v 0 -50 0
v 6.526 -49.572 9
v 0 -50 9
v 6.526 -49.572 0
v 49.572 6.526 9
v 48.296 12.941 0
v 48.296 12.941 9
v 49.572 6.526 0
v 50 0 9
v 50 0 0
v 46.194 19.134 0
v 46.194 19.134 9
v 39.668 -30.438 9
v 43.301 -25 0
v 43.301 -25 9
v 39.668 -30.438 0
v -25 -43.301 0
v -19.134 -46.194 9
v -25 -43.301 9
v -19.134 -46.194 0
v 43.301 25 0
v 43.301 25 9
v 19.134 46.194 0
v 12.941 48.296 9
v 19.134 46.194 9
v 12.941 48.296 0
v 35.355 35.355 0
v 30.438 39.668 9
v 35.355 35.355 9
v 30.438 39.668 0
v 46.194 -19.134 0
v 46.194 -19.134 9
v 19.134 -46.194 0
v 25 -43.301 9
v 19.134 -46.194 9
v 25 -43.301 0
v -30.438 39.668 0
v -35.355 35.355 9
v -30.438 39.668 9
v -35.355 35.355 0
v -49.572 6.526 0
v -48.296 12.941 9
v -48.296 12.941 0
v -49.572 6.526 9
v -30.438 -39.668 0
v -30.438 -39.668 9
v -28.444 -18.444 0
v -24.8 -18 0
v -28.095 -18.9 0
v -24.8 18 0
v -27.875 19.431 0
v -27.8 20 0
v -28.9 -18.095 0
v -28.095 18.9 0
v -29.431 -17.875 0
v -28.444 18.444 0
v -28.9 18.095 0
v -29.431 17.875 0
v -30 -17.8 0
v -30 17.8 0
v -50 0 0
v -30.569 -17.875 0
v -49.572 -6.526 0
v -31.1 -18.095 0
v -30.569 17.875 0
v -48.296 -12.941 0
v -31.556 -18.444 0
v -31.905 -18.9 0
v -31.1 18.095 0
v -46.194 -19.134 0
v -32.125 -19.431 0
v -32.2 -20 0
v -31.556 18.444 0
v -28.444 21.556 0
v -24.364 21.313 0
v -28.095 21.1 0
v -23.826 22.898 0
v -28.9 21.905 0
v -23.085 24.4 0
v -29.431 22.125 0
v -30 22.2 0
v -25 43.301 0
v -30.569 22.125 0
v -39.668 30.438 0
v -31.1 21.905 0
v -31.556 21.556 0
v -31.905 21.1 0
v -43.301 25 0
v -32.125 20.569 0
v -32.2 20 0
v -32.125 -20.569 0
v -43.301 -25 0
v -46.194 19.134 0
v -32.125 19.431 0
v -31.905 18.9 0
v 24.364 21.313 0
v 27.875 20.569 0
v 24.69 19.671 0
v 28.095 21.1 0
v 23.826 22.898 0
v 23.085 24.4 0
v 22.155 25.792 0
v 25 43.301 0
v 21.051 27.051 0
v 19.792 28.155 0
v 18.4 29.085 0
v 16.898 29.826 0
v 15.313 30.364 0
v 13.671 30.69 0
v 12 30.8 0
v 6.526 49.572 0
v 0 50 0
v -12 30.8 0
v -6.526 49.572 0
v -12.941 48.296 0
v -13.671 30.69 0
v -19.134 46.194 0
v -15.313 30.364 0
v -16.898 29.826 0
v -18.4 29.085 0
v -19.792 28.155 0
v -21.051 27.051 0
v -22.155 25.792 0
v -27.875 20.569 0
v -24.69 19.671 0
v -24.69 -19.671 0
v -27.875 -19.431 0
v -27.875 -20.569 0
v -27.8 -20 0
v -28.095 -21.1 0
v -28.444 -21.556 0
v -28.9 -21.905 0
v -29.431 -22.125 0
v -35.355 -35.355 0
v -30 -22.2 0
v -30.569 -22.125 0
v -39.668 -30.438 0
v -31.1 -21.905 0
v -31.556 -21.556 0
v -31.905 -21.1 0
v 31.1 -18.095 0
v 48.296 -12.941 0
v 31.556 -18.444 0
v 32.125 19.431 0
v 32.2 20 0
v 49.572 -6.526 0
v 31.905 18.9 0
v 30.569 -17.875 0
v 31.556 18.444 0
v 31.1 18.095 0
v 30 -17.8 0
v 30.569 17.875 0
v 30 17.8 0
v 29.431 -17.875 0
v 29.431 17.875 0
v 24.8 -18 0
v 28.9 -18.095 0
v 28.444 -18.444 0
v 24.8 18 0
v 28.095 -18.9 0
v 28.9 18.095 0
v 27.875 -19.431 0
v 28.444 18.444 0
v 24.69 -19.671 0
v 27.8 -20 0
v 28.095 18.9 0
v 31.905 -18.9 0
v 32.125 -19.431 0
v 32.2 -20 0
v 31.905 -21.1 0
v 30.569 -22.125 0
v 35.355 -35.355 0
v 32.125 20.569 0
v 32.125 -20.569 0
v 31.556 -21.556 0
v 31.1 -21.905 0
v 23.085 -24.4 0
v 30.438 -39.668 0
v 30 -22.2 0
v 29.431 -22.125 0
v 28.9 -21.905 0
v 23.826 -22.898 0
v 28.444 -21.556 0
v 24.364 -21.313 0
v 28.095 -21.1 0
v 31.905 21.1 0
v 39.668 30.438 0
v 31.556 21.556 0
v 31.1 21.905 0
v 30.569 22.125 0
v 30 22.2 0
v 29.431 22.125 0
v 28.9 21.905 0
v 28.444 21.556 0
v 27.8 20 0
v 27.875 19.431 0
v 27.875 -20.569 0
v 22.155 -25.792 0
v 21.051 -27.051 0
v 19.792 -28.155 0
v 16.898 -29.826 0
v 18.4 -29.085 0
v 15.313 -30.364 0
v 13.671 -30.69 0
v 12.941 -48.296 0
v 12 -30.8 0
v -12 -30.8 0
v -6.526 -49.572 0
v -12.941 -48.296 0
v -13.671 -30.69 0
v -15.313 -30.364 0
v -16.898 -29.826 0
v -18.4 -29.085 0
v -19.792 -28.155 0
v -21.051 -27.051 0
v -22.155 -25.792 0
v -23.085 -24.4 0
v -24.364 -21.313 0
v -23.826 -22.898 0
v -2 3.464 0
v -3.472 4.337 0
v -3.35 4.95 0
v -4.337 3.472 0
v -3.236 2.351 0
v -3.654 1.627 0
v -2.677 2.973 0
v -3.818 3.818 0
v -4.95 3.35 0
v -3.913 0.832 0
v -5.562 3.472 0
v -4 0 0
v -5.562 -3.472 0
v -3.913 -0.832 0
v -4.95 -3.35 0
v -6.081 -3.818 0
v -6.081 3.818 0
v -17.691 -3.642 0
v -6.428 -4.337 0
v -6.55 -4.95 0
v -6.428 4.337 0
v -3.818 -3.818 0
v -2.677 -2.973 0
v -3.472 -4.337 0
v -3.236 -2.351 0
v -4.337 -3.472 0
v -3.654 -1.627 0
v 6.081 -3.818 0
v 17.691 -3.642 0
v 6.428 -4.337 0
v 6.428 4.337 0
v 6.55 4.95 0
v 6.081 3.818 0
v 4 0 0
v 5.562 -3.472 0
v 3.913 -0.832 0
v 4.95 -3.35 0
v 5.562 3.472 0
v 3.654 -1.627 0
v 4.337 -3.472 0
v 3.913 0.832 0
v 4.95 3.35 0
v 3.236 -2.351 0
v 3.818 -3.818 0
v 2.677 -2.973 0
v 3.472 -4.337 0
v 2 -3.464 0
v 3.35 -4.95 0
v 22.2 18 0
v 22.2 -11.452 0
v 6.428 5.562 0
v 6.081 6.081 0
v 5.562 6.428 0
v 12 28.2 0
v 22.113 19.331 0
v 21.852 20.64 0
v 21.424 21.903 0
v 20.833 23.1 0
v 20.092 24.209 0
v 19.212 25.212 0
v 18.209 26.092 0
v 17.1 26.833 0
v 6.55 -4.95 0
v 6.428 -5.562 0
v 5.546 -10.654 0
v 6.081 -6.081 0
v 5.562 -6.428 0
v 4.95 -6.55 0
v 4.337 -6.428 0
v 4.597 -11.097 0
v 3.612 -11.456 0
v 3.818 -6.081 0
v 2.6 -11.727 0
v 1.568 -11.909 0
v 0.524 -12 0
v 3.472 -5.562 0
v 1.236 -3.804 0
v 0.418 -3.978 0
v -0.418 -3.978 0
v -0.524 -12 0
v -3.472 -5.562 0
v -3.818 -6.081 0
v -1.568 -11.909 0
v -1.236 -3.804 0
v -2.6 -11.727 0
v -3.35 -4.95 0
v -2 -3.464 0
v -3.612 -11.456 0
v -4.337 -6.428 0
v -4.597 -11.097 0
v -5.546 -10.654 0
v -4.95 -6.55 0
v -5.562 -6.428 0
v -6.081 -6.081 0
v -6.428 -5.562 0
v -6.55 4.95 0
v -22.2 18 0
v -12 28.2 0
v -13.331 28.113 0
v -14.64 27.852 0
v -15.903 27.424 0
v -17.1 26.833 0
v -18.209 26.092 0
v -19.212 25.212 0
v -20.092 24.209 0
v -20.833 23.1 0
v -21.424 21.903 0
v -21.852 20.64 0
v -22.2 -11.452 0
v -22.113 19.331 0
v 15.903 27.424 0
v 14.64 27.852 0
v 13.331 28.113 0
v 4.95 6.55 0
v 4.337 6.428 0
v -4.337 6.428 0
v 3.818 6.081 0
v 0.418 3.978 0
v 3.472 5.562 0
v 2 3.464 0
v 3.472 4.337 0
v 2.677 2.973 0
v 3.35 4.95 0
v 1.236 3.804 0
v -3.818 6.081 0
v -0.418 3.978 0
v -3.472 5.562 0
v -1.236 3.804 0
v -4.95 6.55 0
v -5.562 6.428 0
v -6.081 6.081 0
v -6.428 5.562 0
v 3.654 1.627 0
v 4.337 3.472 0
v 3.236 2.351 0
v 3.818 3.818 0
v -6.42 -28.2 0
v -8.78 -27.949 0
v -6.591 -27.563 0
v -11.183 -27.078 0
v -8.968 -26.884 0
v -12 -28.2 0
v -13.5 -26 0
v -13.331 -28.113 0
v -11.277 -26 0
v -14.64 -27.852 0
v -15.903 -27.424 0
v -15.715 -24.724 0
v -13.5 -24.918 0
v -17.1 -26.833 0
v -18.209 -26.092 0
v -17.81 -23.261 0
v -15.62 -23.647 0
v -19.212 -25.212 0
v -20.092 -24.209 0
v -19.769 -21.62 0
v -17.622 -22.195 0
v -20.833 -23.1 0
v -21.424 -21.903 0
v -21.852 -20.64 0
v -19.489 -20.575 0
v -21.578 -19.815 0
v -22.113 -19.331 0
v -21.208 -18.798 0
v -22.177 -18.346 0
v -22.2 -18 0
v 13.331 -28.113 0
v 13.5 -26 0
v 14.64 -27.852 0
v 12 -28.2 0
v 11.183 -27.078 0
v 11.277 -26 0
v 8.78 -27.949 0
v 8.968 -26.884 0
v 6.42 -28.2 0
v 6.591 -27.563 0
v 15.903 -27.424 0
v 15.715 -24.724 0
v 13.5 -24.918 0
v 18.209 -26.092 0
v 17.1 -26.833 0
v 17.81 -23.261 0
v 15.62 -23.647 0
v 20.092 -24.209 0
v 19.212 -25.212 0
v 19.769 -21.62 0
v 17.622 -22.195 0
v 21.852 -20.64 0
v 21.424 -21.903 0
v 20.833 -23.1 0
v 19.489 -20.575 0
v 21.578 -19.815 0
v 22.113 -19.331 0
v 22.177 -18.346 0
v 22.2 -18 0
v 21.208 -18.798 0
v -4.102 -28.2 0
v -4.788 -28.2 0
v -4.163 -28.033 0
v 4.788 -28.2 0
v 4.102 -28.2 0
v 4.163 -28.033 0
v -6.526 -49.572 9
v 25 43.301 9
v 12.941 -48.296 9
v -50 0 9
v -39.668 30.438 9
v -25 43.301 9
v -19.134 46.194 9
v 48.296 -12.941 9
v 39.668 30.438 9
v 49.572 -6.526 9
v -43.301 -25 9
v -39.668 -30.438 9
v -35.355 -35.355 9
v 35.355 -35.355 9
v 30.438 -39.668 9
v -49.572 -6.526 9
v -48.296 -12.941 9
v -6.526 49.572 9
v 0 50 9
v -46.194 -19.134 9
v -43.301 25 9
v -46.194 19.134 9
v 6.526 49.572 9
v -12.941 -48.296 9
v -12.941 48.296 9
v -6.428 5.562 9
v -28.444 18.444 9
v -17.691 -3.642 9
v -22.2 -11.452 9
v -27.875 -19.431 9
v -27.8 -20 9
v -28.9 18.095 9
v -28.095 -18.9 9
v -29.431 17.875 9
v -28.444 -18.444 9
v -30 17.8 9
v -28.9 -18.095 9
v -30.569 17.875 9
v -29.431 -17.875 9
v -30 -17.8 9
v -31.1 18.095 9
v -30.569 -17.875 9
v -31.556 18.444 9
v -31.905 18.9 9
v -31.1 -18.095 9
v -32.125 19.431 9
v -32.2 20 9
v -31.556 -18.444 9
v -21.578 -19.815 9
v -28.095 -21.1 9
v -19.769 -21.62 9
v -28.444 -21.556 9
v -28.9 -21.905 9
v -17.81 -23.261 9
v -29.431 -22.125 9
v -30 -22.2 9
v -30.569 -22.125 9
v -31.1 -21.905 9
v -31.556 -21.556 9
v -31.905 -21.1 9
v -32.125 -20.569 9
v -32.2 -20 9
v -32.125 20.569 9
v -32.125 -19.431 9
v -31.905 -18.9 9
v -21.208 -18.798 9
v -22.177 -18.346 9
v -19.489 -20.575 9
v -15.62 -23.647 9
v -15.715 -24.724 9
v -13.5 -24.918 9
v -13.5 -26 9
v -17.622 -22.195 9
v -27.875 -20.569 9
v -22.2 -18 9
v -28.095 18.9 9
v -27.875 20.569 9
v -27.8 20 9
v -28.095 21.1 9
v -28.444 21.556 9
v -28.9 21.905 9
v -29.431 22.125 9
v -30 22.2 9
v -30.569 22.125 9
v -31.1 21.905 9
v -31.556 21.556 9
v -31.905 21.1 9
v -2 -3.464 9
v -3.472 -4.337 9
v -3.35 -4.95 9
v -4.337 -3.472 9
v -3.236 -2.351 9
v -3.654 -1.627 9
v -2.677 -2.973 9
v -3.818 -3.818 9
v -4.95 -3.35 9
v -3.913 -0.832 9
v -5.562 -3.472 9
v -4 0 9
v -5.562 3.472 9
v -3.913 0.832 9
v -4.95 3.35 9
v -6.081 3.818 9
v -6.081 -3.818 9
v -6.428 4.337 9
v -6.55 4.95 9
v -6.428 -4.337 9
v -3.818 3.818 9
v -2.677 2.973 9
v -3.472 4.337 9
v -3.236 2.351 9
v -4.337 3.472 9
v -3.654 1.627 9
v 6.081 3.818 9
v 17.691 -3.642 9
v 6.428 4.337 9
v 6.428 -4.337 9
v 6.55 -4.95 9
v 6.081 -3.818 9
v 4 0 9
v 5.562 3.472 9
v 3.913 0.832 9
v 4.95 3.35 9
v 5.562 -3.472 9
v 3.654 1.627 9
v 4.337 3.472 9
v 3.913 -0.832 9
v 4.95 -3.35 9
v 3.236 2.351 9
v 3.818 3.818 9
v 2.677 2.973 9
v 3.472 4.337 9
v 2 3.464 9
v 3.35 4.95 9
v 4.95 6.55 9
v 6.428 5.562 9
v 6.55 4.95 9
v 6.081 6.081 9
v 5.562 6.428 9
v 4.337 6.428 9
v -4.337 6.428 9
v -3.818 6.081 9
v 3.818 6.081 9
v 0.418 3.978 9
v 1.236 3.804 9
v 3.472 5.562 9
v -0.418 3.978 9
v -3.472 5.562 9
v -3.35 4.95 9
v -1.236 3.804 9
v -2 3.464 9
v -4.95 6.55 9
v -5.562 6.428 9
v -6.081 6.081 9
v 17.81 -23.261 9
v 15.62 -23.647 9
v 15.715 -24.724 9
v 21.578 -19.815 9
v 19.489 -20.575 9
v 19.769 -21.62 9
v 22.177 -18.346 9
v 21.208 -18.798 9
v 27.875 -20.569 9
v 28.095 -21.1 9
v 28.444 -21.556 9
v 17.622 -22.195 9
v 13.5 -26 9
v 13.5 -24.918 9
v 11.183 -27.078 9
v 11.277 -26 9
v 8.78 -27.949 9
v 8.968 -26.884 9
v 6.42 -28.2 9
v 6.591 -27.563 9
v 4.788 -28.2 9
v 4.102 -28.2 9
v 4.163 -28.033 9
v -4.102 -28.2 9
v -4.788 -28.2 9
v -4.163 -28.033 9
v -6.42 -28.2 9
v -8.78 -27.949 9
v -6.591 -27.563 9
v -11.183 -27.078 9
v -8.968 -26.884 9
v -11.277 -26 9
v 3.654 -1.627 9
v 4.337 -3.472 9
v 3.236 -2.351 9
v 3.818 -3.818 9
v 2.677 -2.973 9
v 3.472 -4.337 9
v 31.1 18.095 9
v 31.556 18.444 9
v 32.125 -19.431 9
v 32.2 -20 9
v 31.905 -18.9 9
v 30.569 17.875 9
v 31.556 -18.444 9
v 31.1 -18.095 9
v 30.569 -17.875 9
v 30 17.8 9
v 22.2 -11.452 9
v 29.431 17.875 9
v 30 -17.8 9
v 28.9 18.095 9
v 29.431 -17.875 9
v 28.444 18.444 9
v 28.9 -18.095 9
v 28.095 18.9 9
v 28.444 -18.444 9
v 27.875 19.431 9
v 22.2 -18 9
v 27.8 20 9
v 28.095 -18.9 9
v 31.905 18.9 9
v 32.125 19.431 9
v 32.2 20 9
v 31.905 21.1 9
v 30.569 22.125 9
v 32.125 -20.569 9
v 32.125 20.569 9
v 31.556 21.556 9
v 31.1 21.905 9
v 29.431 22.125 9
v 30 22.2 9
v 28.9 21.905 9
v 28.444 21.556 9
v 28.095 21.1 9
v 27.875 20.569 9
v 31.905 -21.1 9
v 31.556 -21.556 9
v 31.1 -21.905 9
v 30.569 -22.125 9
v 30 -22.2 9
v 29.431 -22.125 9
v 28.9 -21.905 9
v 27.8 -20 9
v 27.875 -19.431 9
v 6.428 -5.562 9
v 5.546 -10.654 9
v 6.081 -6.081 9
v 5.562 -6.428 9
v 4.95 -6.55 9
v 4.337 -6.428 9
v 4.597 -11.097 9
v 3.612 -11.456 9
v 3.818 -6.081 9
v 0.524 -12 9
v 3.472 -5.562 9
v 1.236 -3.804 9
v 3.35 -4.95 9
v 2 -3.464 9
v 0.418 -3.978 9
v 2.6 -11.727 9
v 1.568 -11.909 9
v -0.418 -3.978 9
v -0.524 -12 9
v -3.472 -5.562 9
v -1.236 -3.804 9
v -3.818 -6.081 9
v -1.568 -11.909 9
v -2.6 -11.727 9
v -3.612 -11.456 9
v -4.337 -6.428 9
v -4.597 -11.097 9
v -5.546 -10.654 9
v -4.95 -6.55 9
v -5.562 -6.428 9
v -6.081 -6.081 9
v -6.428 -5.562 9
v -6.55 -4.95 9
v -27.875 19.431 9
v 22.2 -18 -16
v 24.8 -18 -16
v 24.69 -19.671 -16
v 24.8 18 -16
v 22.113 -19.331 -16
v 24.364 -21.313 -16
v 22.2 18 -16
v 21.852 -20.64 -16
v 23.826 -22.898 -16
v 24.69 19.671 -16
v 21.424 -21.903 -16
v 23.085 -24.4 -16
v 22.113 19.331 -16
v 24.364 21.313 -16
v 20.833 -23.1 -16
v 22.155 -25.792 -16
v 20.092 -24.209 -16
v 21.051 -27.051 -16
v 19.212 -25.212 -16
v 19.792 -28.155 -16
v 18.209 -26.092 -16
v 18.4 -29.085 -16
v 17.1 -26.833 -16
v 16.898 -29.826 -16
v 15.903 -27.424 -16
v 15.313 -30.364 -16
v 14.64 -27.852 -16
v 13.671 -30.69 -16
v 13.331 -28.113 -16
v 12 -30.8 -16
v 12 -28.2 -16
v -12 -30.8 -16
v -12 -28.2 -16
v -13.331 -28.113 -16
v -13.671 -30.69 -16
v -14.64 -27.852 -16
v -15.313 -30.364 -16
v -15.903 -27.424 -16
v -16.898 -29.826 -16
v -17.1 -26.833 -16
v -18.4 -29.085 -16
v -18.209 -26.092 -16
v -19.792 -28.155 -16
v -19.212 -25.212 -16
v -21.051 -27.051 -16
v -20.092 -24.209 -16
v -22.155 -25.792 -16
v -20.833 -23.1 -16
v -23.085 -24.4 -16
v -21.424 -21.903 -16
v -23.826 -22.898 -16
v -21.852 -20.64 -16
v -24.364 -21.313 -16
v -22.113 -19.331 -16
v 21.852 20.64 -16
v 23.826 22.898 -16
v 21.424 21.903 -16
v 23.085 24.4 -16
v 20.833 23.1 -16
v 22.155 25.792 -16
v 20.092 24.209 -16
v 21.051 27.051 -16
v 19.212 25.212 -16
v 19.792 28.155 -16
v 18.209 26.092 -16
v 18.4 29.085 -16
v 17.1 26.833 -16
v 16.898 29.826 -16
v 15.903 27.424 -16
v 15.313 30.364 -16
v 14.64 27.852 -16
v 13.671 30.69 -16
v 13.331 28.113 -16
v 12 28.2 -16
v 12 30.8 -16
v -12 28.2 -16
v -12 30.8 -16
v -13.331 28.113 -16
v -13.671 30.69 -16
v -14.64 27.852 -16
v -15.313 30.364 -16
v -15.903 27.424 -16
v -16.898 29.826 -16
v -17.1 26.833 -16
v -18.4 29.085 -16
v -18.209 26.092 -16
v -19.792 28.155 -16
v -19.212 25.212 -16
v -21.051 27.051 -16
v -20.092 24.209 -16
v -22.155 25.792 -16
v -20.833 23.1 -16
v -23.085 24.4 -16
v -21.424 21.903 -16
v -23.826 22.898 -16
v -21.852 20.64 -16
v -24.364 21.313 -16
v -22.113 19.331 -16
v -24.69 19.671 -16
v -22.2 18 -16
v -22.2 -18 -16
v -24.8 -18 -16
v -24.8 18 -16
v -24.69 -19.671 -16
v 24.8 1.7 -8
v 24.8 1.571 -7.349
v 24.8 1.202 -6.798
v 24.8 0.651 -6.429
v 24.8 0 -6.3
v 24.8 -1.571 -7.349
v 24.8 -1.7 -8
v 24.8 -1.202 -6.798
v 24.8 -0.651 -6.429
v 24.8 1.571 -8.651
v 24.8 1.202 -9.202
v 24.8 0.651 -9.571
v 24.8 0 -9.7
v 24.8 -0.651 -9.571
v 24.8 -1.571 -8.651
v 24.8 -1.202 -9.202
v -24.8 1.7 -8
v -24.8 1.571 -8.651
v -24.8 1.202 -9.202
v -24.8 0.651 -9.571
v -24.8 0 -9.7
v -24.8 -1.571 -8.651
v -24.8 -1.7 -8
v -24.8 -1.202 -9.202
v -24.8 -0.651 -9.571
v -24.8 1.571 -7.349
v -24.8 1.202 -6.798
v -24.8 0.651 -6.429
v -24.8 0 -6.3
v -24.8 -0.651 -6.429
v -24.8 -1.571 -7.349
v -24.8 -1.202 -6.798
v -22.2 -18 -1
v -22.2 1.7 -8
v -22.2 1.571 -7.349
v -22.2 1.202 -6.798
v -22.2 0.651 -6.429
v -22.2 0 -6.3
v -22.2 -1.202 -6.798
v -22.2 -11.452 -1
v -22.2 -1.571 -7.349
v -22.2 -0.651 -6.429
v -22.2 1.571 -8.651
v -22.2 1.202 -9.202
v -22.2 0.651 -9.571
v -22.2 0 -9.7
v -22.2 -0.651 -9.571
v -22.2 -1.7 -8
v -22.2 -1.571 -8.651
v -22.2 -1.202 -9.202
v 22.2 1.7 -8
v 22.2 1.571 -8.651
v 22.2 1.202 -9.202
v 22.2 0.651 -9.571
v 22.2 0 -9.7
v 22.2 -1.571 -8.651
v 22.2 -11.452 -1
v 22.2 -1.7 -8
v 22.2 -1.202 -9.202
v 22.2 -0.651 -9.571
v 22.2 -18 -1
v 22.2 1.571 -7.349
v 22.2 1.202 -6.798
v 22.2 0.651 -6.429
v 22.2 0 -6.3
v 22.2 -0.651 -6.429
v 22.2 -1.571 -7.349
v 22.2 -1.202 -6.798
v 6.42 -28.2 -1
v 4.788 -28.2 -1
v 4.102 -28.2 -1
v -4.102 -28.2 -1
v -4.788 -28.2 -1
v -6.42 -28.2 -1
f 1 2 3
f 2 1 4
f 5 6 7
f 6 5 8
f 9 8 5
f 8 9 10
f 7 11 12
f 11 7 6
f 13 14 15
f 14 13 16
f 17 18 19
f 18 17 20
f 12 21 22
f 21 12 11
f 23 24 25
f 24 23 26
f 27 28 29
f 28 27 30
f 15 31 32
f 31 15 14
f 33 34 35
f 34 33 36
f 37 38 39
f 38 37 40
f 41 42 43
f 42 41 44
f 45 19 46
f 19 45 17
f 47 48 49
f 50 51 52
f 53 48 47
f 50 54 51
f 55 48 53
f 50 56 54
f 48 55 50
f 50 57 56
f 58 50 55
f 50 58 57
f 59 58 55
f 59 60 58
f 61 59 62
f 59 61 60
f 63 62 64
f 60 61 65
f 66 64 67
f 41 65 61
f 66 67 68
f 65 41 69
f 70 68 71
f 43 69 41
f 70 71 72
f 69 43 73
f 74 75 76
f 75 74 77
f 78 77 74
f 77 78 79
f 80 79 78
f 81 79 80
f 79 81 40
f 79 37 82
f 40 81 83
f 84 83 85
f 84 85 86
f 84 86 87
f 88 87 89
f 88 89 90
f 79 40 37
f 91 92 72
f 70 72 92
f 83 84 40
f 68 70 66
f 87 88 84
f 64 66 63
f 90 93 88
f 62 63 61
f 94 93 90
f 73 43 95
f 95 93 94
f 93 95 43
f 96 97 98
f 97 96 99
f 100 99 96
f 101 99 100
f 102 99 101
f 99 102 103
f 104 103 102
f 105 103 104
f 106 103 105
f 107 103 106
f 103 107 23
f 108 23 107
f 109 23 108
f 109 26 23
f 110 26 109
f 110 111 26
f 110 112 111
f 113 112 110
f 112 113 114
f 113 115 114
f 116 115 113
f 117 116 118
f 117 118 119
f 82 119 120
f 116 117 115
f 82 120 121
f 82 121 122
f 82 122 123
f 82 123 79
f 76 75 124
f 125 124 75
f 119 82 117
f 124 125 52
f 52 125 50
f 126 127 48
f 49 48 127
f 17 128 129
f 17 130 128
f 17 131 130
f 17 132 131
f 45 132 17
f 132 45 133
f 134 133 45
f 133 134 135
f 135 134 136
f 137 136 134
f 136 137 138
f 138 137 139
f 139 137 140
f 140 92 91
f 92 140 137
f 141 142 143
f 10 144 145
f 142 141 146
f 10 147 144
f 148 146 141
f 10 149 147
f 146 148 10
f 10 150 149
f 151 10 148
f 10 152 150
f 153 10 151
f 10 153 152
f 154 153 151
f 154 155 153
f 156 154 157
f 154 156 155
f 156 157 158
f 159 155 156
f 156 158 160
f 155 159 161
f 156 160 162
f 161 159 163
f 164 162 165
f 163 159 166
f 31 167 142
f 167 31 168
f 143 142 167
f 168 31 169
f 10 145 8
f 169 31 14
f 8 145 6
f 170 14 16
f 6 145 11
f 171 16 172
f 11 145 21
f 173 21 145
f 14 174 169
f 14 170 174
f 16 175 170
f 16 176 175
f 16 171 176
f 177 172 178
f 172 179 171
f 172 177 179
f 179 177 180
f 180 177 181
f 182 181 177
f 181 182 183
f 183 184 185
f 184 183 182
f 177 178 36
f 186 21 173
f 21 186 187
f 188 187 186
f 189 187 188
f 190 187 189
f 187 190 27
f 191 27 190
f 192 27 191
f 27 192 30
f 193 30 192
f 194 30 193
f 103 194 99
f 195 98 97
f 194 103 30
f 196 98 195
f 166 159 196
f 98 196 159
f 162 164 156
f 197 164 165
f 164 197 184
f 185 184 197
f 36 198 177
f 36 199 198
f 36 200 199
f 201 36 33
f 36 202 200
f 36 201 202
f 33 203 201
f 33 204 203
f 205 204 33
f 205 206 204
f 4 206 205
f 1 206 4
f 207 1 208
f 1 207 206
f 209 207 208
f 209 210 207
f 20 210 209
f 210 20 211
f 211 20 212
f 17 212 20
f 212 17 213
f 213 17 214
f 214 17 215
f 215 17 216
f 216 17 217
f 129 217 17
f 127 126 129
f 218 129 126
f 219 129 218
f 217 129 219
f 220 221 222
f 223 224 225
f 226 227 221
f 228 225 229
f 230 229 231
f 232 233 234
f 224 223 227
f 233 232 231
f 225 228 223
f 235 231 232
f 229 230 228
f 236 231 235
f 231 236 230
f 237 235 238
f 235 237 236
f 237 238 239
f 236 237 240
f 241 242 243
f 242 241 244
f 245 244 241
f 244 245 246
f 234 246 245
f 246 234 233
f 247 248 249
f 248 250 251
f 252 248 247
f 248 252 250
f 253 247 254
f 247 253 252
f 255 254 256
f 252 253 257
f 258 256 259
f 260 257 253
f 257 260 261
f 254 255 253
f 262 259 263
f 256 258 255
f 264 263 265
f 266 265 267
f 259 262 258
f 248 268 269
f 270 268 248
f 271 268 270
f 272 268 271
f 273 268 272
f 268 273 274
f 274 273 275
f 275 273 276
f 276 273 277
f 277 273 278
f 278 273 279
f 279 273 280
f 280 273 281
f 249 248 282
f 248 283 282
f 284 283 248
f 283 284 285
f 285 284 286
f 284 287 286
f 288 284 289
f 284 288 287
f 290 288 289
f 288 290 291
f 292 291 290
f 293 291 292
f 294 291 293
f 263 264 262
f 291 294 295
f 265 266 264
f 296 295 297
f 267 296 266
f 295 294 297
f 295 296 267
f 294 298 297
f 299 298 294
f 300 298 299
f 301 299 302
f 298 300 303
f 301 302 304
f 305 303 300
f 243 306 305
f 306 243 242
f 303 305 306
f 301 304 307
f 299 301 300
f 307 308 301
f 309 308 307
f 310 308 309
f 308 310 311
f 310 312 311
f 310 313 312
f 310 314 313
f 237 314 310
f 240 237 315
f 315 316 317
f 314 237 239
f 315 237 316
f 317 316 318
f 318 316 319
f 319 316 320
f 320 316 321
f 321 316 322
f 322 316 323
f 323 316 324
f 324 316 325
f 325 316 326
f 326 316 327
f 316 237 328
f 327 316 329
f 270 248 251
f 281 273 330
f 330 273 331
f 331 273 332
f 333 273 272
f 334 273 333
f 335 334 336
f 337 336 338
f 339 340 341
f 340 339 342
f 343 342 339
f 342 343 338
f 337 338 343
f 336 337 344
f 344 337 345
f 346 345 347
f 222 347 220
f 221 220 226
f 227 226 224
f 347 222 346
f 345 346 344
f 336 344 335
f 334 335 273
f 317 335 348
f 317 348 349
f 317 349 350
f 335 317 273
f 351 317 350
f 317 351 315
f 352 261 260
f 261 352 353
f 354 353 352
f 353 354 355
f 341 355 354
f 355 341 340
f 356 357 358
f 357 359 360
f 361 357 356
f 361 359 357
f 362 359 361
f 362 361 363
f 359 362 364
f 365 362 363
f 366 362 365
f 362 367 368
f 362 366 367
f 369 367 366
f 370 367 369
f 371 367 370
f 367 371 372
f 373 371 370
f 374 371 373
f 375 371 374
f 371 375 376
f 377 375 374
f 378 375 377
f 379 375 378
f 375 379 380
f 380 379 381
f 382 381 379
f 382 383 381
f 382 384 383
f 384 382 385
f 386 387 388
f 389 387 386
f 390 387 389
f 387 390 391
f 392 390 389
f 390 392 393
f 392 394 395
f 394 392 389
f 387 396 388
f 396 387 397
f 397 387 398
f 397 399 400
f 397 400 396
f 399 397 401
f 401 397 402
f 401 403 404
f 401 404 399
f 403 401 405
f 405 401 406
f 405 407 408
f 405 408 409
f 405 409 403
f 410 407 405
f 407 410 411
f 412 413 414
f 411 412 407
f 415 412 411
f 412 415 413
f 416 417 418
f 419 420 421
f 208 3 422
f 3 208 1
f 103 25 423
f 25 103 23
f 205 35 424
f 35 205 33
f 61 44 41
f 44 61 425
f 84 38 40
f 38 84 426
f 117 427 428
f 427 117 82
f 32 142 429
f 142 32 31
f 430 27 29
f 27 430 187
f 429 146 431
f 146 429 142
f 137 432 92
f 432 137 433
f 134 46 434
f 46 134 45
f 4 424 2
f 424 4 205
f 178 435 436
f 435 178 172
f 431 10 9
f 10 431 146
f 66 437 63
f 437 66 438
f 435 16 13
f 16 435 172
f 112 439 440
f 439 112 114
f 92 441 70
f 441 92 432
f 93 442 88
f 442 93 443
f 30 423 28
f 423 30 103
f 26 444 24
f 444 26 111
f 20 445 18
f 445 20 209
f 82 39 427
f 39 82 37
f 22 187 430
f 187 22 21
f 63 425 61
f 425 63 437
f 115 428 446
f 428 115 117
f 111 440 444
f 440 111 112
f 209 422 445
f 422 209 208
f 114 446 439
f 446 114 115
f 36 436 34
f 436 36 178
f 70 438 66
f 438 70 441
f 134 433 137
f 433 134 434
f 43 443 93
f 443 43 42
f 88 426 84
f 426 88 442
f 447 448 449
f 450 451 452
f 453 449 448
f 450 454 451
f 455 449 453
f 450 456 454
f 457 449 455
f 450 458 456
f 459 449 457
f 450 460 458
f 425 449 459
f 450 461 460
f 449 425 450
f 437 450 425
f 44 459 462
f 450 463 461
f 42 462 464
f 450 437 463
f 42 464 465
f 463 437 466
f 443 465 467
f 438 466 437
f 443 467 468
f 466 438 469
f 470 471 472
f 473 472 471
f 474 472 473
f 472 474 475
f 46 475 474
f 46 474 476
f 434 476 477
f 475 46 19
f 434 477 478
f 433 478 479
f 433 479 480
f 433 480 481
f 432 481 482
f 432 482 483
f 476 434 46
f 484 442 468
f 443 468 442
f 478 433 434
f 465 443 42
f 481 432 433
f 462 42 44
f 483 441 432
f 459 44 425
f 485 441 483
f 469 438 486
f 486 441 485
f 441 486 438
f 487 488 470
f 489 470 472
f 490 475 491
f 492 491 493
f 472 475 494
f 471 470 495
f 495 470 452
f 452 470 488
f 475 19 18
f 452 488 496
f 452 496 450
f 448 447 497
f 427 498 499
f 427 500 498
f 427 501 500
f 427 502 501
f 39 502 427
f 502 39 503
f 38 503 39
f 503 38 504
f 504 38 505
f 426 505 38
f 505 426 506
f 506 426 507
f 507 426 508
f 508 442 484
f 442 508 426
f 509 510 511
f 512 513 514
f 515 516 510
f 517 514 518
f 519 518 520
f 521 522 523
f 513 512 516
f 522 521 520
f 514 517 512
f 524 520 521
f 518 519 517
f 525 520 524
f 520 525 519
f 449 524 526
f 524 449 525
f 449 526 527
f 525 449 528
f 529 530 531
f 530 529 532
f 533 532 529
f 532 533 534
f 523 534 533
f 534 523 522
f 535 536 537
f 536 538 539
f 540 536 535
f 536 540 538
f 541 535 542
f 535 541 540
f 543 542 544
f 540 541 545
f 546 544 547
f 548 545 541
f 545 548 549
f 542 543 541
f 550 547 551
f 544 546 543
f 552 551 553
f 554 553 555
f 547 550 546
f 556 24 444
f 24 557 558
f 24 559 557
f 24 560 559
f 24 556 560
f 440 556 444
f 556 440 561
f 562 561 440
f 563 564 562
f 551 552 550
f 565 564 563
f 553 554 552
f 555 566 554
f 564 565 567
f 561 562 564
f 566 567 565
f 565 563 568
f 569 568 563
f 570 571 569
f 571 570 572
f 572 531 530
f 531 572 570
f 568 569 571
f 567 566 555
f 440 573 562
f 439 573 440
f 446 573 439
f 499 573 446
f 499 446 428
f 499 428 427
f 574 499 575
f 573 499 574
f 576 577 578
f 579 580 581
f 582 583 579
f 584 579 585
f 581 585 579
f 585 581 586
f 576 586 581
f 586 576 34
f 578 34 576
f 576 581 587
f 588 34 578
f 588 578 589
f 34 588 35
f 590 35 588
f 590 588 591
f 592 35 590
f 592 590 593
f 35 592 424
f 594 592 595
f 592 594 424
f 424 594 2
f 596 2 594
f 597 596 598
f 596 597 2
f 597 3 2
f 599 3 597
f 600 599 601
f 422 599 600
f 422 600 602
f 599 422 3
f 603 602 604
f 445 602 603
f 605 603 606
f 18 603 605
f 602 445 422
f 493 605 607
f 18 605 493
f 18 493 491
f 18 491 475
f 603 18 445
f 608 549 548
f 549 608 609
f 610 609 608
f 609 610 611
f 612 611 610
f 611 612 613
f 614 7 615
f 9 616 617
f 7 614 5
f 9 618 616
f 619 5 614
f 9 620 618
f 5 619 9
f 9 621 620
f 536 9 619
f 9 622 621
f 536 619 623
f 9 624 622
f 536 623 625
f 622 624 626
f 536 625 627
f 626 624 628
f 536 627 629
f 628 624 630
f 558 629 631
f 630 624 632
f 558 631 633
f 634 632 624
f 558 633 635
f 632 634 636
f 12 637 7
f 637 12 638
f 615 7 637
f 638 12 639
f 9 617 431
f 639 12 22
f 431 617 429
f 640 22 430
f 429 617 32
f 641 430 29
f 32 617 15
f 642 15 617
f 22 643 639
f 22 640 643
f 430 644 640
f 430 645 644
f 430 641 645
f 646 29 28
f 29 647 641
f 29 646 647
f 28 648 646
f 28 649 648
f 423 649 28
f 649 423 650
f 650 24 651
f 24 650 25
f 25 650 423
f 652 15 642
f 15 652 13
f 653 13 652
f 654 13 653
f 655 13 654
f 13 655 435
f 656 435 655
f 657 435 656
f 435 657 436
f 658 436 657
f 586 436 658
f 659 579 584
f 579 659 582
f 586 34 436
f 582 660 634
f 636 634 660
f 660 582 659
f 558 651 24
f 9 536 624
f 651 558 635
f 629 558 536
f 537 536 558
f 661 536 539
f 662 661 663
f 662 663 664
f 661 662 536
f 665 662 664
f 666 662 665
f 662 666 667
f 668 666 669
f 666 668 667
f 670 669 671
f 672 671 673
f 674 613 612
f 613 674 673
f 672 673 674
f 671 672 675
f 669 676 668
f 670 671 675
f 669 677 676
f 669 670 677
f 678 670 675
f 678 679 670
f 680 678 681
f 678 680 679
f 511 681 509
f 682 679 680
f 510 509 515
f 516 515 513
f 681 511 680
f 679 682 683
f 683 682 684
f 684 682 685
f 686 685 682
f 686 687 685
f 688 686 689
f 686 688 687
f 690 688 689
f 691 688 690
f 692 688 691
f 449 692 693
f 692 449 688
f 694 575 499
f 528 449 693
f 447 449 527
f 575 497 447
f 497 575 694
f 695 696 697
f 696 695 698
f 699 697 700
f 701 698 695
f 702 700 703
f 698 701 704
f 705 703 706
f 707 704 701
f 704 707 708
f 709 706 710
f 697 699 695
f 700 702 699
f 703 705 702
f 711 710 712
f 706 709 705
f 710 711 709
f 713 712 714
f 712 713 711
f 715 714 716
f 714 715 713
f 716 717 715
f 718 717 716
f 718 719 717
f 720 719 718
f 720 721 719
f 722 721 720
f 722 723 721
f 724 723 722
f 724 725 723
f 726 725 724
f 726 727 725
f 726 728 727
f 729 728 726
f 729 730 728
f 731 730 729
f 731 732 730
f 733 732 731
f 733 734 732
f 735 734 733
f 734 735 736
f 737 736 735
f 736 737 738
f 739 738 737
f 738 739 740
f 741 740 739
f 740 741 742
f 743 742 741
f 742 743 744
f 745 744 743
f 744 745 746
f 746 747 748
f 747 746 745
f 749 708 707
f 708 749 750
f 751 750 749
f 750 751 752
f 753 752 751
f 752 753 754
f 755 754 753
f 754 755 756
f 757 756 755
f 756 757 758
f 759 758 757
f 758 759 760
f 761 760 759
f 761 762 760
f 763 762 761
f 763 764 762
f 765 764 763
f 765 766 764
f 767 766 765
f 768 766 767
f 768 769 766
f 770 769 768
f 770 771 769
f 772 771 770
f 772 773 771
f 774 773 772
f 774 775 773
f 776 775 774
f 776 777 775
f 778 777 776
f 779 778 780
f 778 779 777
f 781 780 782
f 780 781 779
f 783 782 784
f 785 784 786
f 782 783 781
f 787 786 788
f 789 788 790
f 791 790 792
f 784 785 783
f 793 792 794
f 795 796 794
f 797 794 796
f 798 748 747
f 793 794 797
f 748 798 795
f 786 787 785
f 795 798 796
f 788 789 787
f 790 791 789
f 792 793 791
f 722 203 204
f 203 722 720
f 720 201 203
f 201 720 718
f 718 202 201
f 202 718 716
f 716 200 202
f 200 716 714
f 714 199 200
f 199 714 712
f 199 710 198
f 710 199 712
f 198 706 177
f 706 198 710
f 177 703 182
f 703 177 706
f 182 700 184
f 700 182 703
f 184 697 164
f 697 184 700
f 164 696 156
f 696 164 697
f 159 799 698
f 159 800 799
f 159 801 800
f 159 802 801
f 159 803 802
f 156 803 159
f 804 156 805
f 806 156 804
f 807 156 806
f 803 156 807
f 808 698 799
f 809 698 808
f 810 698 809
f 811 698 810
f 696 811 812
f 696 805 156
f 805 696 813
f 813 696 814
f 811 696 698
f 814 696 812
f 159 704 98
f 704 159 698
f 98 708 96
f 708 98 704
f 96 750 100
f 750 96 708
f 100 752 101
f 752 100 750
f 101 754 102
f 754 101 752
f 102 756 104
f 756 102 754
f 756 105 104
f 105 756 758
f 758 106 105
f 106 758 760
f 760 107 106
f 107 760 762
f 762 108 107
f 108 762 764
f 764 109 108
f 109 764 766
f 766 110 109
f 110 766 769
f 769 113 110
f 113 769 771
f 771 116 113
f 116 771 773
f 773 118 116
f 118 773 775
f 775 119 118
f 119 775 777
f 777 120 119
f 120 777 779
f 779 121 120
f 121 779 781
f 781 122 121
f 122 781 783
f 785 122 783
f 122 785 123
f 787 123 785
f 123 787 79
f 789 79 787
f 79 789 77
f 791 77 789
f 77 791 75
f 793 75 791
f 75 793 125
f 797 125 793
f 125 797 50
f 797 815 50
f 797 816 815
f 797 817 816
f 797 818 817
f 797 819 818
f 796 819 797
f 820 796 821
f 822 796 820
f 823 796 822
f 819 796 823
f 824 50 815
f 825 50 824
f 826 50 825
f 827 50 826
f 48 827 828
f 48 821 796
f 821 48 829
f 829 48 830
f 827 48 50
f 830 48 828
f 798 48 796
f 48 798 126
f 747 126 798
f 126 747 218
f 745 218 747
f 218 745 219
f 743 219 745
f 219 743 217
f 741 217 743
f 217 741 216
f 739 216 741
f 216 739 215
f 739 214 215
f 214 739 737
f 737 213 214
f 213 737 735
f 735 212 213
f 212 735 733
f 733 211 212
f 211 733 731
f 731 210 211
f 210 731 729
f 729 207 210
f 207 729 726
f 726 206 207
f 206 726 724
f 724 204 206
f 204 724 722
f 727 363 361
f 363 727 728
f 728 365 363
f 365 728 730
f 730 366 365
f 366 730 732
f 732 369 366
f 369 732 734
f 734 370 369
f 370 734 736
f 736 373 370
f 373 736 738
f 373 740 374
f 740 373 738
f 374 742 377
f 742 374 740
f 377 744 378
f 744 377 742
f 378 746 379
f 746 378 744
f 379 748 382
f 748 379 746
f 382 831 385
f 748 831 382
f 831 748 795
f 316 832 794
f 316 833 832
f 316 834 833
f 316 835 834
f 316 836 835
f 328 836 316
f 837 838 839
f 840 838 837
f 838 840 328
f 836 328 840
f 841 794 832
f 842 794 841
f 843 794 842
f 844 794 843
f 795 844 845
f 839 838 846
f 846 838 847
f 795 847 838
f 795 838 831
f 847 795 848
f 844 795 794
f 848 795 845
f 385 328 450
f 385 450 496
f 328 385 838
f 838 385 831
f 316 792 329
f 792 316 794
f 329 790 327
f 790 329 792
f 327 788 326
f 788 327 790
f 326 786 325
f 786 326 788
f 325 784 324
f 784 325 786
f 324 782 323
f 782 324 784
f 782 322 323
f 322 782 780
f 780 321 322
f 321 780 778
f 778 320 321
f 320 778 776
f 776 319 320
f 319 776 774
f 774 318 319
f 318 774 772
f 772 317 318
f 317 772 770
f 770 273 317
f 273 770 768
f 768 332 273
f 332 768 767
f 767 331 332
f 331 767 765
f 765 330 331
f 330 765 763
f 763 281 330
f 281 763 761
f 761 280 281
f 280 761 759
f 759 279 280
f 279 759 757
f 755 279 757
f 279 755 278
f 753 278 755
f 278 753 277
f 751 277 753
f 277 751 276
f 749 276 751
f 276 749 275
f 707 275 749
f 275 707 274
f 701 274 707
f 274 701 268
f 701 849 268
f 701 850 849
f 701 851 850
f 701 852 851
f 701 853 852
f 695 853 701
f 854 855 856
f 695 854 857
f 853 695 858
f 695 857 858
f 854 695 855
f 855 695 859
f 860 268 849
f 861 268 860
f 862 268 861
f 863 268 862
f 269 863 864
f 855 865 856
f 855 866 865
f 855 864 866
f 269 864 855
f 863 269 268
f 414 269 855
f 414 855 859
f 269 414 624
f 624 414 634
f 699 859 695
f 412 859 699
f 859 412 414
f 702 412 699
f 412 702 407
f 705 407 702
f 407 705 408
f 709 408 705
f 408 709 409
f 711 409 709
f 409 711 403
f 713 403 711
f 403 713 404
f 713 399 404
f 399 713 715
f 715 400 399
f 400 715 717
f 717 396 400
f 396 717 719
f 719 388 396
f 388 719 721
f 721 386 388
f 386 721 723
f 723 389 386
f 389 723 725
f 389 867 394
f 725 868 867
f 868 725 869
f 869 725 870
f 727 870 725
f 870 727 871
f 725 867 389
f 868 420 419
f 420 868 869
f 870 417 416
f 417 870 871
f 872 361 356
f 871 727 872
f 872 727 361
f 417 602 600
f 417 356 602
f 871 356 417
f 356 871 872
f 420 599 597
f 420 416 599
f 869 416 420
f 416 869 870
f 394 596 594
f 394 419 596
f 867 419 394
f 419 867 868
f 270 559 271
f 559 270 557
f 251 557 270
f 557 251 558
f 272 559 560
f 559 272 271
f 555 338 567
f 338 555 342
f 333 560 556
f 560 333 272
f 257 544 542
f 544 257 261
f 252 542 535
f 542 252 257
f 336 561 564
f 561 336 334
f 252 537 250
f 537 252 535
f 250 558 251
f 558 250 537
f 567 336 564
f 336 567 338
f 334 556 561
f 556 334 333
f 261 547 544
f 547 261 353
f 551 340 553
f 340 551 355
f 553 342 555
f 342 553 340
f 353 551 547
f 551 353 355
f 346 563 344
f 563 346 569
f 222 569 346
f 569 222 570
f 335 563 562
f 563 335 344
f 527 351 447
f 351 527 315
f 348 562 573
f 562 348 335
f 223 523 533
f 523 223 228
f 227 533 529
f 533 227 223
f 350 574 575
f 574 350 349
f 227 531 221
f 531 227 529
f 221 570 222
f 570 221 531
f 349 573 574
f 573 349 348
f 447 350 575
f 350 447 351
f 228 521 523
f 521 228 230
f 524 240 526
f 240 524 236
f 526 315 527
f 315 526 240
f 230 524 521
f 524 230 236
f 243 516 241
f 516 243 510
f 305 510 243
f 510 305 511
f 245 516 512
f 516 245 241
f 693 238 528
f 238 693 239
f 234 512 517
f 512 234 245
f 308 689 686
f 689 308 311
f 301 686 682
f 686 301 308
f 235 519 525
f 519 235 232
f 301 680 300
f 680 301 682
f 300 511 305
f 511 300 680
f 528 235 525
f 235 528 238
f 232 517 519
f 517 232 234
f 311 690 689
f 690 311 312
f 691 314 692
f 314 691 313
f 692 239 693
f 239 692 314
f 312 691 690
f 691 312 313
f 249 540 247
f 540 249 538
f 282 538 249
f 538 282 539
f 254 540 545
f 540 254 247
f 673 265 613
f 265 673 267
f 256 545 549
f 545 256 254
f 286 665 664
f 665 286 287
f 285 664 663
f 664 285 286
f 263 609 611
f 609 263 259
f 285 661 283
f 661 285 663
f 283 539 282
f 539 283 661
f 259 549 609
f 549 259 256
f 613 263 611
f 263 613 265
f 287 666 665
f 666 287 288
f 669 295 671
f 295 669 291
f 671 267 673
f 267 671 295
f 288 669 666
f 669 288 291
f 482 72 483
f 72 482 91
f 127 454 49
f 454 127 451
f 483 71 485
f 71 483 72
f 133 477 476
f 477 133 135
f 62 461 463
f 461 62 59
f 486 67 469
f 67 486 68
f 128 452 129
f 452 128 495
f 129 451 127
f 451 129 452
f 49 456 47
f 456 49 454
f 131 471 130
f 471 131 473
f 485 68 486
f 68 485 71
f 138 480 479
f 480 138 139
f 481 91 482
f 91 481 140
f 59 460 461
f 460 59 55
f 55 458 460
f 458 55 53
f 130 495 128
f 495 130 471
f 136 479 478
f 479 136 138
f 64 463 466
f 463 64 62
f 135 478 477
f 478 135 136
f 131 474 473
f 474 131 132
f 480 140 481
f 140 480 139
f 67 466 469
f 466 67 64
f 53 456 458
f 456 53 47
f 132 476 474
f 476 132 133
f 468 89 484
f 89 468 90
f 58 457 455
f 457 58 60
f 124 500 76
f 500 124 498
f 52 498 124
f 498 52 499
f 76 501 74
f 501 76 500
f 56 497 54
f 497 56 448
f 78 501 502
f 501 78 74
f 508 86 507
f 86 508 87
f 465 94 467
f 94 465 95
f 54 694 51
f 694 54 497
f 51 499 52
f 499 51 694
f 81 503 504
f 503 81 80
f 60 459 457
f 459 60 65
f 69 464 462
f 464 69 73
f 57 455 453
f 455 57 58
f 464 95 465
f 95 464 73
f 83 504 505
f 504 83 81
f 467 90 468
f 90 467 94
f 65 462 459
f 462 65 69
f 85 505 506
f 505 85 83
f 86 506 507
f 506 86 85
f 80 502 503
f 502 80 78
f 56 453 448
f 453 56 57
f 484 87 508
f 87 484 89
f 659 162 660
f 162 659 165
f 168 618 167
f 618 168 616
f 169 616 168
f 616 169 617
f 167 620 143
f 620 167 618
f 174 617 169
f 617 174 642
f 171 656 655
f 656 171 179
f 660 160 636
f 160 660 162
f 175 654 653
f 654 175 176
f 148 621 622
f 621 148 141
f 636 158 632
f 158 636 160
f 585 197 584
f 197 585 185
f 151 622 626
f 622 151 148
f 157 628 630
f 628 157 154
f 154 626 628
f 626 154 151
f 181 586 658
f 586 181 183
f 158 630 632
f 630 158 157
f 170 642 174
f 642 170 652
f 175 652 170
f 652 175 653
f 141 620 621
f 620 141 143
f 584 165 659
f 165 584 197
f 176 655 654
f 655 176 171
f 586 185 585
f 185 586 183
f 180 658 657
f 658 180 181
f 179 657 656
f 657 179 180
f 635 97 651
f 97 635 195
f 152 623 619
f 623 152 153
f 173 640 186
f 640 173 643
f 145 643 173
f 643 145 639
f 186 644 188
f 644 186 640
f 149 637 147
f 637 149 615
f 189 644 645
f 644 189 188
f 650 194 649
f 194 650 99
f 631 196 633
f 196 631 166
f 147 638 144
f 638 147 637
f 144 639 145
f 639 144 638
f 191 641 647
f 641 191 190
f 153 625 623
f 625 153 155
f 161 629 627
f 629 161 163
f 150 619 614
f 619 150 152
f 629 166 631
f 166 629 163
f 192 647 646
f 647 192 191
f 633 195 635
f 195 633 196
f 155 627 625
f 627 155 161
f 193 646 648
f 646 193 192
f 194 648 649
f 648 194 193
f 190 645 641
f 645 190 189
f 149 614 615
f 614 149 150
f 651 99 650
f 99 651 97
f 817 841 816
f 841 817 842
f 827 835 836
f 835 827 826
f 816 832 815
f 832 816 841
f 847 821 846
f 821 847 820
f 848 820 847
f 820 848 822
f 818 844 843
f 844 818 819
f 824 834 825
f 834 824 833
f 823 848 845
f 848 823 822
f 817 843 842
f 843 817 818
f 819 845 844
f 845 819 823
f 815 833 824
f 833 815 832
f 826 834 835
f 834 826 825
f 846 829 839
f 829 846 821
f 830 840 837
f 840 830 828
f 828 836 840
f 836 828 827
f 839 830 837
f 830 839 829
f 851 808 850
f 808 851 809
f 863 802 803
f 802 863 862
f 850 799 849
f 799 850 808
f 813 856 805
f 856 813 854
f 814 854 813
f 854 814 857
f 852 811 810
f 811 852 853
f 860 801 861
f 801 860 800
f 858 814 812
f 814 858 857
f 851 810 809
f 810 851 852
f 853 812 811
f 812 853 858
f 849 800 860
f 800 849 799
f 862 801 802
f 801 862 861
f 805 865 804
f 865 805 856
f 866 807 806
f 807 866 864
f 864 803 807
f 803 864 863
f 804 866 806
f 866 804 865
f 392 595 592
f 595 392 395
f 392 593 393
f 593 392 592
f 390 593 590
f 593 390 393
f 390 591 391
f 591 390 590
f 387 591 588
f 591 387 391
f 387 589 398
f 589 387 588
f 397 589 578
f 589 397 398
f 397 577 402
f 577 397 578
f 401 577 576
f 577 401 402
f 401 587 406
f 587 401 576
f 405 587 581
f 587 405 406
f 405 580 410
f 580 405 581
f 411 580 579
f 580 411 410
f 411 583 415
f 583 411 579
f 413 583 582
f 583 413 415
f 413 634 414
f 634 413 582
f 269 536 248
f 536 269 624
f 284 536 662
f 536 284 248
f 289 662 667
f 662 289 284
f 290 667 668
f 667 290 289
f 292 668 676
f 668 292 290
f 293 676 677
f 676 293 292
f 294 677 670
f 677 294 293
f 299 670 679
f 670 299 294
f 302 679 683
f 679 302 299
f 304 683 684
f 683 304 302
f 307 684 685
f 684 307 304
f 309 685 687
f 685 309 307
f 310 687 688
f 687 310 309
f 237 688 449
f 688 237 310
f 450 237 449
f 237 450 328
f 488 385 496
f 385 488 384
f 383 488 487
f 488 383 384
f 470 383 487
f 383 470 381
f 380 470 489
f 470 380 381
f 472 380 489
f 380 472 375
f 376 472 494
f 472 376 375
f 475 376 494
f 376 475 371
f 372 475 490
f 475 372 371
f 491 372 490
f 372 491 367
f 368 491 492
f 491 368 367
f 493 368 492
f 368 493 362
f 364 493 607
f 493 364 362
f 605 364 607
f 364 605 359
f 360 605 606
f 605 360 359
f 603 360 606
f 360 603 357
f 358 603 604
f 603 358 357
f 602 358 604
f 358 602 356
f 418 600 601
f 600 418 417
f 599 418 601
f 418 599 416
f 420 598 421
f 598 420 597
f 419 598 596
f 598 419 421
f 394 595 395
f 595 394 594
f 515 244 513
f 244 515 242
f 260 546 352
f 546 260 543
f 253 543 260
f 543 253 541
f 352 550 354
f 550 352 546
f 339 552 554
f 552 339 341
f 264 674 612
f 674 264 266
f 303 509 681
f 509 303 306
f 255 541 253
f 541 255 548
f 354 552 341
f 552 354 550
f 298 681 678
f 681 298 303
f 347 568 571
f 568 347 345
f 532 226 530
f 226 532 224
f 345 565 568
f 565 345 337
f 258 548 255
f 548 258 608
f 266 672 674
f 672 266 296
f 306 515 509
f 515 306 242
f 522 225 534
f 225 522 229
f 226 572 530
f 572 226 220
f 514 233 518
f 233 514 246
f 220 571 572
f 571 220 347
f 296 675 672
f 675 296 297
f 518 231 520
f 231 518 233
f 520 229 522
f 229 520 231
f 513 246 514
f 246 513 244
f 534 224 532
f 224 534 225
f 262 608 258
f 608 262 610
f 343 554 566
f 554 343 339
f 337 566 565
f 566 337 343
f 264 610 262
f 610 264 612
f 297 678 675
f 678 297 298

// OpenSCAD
// =====================================================================
// ###  PAN / TILT INTERFACE  -  THE PART THE OWNER CAN REPLACE WITH HIS OWN DESIGN  ###
//
// Two interfaces, both with their numbers in robot2_params.scad (section PAN / TILT):
//   INTERFACE 1  "mast top":  the round MAST-TOP PLATE (neck_plate) below. It carries 4 x M4 holes on a
//                 if1_bolt_dx x if1_bolt_dy pattern, a cable opening (a kidney shape: the swept envelope of the cable bundle for
//                 +-pan_cable_deg, see CABLE PATH in robot2_params.scad), and the stadium socket that the mast shells slide into.
//                 His pan/tilt base bolts to these 4 holes.
//   INTERFACE 2  "head back": a pad on the head lid with 4 x M3 inserts on an if2_bolt_dx x if2_bolt_dy pattern.
//                 His tilt output (platform / bracket) bolts to these 4 inserts.
// My DEFAULT pan/tilt (two MG996R servos): neck_plate + turntable + 2 yoke halves + the head's own servo pocket.
// If you use his design: print neck_plate only, skip turntable and yoke_half, and tell me the numbers listed in
// docs/mechanical-design.md, section 7.4.
// Default output of this file = the mast-top plate.
// =====================================================================
_robot2_lib = true;   // tells robot2_params.scad that it is used as a library (no demo shape)
include <robot2_params.scad>

show = "plate";    // "plate" | "turntable" | "yoke_servo" | "yoke_plain" | "stack"

// ------------------------------------------------------------------ INTERFACE 1: mast-top plate  (print 1)
// Cable opening (finding 20 / R21). The bundle (bundle_w x bundle_t, centre y = bundle_cy) is held by the turntable slot and turns with the head. The plate is fixed, so its opening must hold the
// bundle at every pan angle from -pan_cable_deg to +pan_cable_deg: it is the union of the bundle rectangle (plus cable_clr all round) turned in steps of cable_sweep_step degrees.
// It is clipped to the inside of the mast socket below (44.4 x 56.4 mm), so it never cuts into the socket wall. At +-30 degrees a straight, stiff bundle still pokes about 1 mm into the socket wall at one corner
// and about 4 mm into the shell wall under the plate (the shells are 3 mm thick, their cavity is 38 x 50 mm): a soft bundle squeezes in there.
module plate_cable_opening2d() {
    intersection() {
        union() for (a = [-pan_cable_deg : cable_sweep_step : pan_cable_deg])
            rotate(a) translate([0, bundle_cy]) square([bundle_w + 2 * cable_clr, bundle_t + 2 * cable_clr], center = true);
        rrect2(mast_d + 0.4, mast_w + 0.4, mast_r + 0.2);
    }
}
// local z = 0 is the underside of the plate; the socket reaches down to z = -neck_sock_h
module neck_plate() {
    difference() {
        union() {
            cylinder(r = 50, h = neck_plate_t);                                          // plate, 100 mm round
            translate([0, 0, -neck_sock_h]) linear_extrude(height = neck_sock_h + eps)       // socket for the mast shells
                difference() { rrect2(mast_d + 5.6, mast_w + 5.6, mast_r + 2.8); rrect2(mast_d + 0.4, mast_w + 0.4, mast_r + 0.2); }
        }
        // cable opening: swept envelope of the bundle for pan -pan_cable_deg ... +pan_cable_deg (inside the mast cavity, beside the pan servo). Was a fixed 38 x 12.5 slot.
        translate([0, 0, -1]) linear_extrude(height = neck_plate_t + 2) plate_cable_opening2d();
        // pan horn (aluminium 25T disc, M3 threads in the horn): 4 x M3 x 14 from BELOW through plain holes, and a centre hole for the horn screw
        for (a = [45, 135, 225, 315]) translate([horn_pcd / 2 * cos(a), horn_pcd / 2 * sin(a), -1]) cylinder(d = horn_hole, h = neck_plate_t + 2, $fn = 16);
        translate([0, 0, -1]) cylinder(d = 8, h = neck_plate_t + 2, $fn = 30);
        // INTERFACE 1 bolt pattern: 4 x M4 through holes (his pan/tilt base bolts here)
        for (sx = [-1, 1], sy = [-1, 1]) translate([sx * if1_bolt_dx / 2, sy * if1_bolt_dy / 2, -1]) cylinder(d = if1_bolt_d, h = neck_plate_t + 2, $fn = 24);
        // socket screws (2): along x through the socket walls, M3 x 12
        for (s = [-1, 1]) translate([s * (mast_d / 2 + 4), 0, -neck_sock_h / 2]) rotate([0, 90, 0]) cylinder(d = 3.4, h = 10, center = true, $fn = 16);
    }
}

// ------------------------------------------------------------------ turntable  (print 1)
// local z = 0 is the underside of the plate that rests on the glide ring; skirt hangs below.
// Servo (inverted, long axis along x, overhang to the back) sits in the cut-out with its ears on top of the plate.
module turntable() {
    ear_cx = -(srv_l - srv_shaft_off - srv_shaft_off) / 2;                           // centre of the servo case along x (negative = back)
    difference() {
        union() {
            cylinder(r = skirt_r + skirt_t, h = tt_t);
            translate([0, 0, -skirt_h]) ring(skirt_r + skirt_t, skirt_r, skirt_h + eps);
            for (x = [srv_ear_hole_dx / 2 + ear_cx, -srv_ear_hole_dx / 2 + ear_cx], y = [-srv_ear_hole_dy / 2, srv_ear_hole_dy / 2])
                translate([x, y, -3]) cylinder(d = 11, h = 3 + eps, $fn = 30);          // pads under the ear screws (insert depth); the case cut-out below trims their inner side flat
        }
        // servo case cut-out. It starts BELOW the pads (z -4), so it also trims the inner edge of the 4 ear pads: before, the pads (d 11) reached 1.1 mm into the servo case.
        translate([-(srv_l - srv_shaft_off) - 0.2, -srv_w / 2 - 0.3, -4]) cube([srv_l + 0.4, srv_w + 0.6, tt_t + 5]);
        for (x = [srv_ear_hole_dx / 2 + ear_cx, -srv_ear_hole_dx / 2 + ear_cx], y = [-srv_ear_hole_dy / 2, srv_ear_hole_dy / 2])
            translate([x, y, tt_t - 6]) cylinder(d = 5.6, h = 10, $fn = 24);          // M4 insert holes from the top
        translate([tt_slot_x0, tt_slot_y0, -1]) cube([tt_slot_x1 - tt_slot_x0, tt_slot_y1 - tt_slot_y0, tt_t + 2]);   // cable slot 38 x 14 (turns with the head; the bundle sits at y = bundle_cy in it; the plate opening below follows the bundle, see neck_plate)
        for (sy = [-1, 1], sx = [-12, 12], y = [30, 37]) translate([sx, sy * y, -1]) cylinder(d = 3.4, h = tt_t + 2, $fn = 16);   // yoke screws from below
    }
}

// ------------------------------------------------------------------ yoke half  (print 2: one with servo=true on the +y side, one plain on -y)
// local z = 0 is the top of the turntable. +y half. head_w/2 + yoke_gap = inner face of the arm.
module yoke_half(servo = true) {
    y_in = head_w / 2 + yoke_gap;
    y_out = y_in + yoke_arm_t;
    ax = neck_axis_above_tt;
    difference() {
        union() {
            translate([-yoke_arm_w / 2, 26, 0]) cube([yoke_arm_w, y_out - 26, yoke_bar_t]);              // bar on the turntable
            translate([0, y_out, 0]) rotate([90, 0, 0]) linear_extrude(height = yoke_arm_t)             // arm
                hull() { translate([0, ax]) circle(r = yoke_arm_w / 2, $fn = 60); translate([-yoke_arm_w / 2, 0]) square([yoke_arm_w, 1]); }
            // gusset
            hull() { translate([-yoke_arm_w / 2, y_in - 22, 0]) cube([yoke_arm_w, 22, yoke_bar_t]);
                     translate([-yoke_arm_w / 2, y_in - 0.1, 0]) cube([yoke_arm_w, 0.1, 40]); }
        }
        // 4 inserts from below for the turntable screws (M3)
        for (sx = [-12, 12], y = [30, 37]) translate([sx, y, -1]) insert_hole(4.0, 7);
        // pivot / horn centre hole
        translate([0, y_in - 1, ax]) rotate([-90, 0, 0]) cylinder(d = servo ? 8 : 5.4, h = yoke_arm_t + 2, $fn = 30);
        if (servo) for (a = [45, 135, 225, 315])                                                       // horn: 4 x M3 on the 14 mm circle, from the outside
            translate([horn_pcd / 2 * cos(a), y_in - 1, ax + horn_pcd / 2 * sin(a)]) rotate([-90, 0, 0]) cylinder(d = horn_hole, h = yoke_arm_t + 2, $fn = 16);
    }
}
module yoke_half_minus() { mirror([0, 1, 0]) yoke_half(false); }

// ------------------------------------------------------------------ default output
module stack_view() {
    neck_plate();
    translate([0, 0, neck_plate_t + tt_top_above_plate - tt_t]) turntable();
    translate([0, 0, neck_plate_t + tt_top_above_plate]) { yoke_half(true); yoke_half_minus(); }
}
if (show == "plate") neck_plate();
else if (show == "turntable") turntable();
else if (show == "yoke_servo") yoke_half(true);
else if (show == "yoke_plain") yoke_half(false);
else stack_view();
